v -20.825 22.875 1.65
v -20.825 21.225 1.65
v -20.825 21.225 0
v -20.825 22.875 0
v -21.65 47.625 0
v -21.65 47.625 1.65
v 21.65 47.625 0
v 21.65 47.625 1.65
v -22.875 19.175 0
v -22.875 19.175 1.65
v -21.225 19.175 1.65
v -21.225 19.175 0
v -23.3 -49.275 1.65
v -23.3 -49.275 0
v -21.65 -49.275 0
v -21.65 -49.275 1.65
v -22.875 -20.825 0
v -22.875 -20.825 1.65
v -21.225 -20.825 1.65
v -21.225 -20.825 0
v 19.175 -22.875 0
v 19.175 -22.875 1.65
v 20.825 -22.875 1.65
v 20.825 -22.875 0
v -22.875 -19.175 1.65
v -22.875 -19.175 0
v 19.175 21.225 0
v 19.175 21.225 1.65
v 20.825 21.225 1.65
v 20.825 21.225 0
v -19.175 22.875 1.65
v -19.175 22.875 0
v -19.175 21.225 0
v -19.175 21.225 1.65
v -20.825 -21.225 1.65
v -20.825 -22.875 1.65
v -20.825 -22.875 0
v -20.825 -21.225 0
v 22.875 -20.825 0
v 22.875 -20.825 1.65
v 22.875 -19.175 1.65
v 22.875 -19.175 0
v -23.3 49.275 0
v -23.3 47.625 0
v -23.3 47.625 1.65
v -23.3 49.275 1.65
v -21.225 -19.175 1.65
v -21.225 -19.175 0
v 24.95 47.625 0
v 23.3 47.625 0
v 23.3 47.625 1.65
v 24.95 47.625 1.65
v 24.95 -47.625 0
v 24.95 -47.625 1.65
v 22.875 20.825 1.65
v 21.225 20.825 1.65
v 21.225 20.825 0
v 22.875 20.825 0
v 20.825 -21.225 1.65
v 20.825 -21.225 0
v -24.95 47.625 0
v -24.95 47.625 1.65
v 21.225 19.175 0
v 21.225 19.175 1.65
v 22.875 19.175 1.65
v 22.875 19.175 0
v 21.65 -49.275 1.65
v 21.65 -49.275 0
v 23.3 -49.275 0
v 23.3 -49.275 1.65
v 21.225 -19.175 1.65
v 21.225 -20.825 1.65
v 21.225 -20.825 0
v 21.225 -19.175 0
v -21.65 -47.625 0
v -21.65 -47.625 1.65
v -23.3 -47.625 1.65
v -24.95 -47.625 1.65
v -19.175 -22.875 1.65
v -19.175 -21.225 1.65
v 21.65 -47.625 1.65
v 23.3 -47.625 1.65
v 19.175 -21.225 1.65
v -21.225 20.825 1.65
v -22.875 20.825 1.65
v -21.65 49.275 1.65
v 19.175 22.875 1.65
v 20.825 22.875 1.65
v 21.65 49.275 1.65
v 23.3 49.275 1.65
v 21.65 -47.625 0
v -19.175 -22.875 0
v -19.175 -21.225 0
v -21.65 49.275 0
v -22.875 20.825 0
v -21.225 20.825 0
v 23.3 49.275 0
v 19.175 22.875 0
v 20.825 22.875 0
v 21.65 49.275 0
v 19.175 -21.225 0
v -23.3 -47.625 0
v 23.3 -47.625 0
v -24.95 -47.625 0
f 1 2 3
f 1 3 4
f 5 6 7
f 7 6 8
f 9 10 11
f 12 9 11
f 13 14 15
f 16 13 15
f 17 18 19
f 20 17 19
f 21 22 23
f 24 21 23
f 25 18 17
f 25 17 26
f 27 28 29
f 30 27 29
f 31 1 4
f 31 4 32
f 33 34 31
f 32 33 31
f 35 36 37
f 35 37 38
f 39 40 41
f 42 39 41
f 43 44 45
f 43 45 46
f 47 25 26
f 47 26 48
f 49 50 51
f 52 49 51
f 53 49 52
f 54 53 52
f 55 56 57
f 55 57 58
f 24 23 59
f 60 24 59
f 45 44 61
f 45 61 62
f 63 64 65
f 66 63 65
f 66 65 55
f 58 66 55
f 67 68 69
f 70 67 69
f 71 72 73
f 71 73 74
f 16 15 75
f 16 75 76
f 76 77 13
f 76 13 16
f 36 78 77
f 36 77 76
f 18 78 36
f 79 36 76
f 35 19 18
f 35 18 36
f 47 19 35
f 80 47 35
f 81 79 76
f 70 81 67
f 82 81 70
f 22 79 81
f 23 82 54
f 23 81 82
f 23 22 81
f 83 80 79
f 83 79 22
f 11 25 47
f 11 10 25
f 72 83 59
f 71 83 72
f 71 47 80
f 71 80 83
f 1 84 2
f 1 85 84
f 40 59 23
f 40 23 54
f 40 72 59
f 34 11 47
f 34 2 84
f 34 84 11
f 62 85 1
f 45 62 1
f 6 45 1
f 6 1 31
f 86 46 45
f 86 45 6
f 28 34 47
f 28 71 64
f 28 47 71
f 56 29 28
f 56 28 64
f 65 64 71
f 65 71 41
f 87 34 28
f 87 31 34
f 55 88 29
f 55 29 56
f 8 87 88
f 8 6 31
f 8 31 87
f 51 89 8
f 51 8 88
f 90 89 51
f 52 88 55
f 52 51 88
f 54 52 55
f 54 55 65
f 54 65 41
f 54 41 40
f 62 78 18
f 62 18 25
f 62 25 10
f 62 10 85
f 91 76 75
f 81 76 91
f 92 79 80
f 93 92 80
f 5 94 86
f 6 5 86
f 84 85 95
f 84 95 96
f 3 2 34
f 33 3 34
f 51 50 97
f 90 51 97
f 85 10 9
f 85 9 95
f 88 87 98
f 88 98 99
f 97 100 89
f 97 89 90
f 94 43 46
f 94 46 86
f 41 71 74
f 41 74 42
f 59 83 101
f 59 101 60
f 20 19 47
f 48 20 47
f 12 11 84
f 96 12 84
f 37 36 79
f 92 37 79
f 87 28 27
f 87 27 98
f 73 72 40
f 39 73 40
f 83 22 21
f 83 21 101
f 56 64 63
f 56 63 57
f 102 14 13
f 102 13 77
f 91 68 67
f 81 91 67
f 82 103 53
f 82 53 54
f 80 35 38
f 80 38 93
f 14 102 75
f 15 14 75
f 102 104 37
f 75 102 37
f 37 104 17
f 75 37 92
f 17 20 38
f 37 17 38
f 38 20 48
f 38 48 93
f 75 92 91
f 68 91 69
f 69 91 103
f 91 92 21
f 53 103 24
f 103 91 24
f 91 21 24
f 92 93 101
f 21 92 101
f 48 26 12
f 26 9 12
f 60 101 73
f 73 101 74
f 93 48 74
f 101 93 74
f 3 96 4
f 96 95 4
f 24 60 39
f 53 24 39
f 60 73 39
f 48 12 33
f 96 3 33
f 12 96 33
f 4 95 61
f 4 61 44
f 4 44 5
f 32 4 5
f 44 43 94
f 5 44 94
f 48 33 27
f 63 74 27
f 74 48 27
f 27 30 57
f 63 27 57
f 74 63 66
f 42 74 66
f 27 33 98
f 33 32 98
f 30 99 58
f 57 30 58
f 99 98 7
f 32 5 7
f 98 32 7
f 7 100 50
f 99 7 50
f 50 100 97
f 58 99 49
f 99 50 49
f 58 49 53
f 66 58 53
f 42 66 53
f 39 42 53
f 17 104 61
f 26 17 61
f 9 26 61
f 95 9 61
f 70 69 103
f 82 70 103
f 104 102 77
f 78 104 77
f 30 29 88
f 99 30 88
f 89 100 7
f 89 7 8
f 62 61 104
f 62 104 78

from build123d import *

# Parameters (mm, degrees)
SKETCH1_W           = 46.6
SKETCH1_H           = 98.55
BOSS_EXTRUDE1_DEPTH = 1.65
SKETCH3_W           = 1.65
SKETCH3_H           = 95.25
BOSS_EXTRUDE2_DEPTH = 1.65
SKETCH2_W           = 1.65
SKETCH2_H           = 1.65
CUT_EXTRUDE1_DEPTH  = 1.65
SKETCH4_W           = 43.3
SKETCH4_H           = 1.65
CUT_EXTRUDE2_DEPTH  = 1.65


with BuildPart() as part:
    # Sketch1 → Boss-Extrude1 (new body)
    with BuildSketch(Plane.XY):
        Rectangle(SKETCH1_W, SKETCH1_H)
    extrude(amount=BOSS_EXTRUDE1_DEPTH)

    # Sketch3 → Boss-Extrude2 (add)
    with BuildSketch(Plane.ZY.offset(23.3)):
        with Locations((0.825, 0)):
            Rectangle(SKETCH3_W, SKETCH3_H)
    boss_extrude2 = extrude(amount=BOSS_EXTRUDE2_DEPTH)

    # Mirror1: Boss-Extrude2 across plane
    add(boss_extrude2.mirror(Plane(origin=(0, 0, 0), x_dir=(0, 0, 1), z_dir=(1, 0, 0))))

    # Sketch2 → Cut-Extrude1 (cut)
    with BuildSketch(Plane.XY.offset(1.65)):
        with Locations((20, -22.05)):
            Rectangle(SKETCH2_W, SKETCH2_H)
        with Locations((-20, -22.05)):
            Rectangle(SKETCH2_W, SKETCH2_H)
        with Locations((-22.05, -20)):
            Rectangle(SKETCH2_W, SKETCH2_H)
        with Locations((-22.05, 20)):
            Rectangle(SKETCH2_W, SKETCH2_H)
        with Locations((-20, 22.05)):
            Rectangle(SKETCH2_W, SKETCH2_H)
        with Locations((20, 22.05)):
            Rectangle(SKETCH2_W, SKETCH2_H)
        with Locations((22.05, 20)):
            Rectangle(SKETCH2_W, SKETCH2_H)
        with Locations((22.05, -20)):
            Rectangle(SKETCH2_W, SKETCH2_H)
    extrude(amount=-CUT_EXTRUDE1_DEPTH, mode=Mode.SUBTRACT)

    # Sketch4 → Cut-Extrude2 (cut)
    with BuildSketch(Plane.XZ.offset(49.275)):
        with Locations((0, 0.825)):
            Rectangle(SKETCH4_W, SKETCH4_H)
    cut_extrude2 = extrude(amount=-CUT_EXTRUDE2_DEPTH, mode=Mode.SUBTRACT)

    # Mirror2: Cut-Extrude2 across plane
    add(cut_extrude2.mirror(Plane.ZX), mode=Mode.SUBTRACT)


solid = part.part
